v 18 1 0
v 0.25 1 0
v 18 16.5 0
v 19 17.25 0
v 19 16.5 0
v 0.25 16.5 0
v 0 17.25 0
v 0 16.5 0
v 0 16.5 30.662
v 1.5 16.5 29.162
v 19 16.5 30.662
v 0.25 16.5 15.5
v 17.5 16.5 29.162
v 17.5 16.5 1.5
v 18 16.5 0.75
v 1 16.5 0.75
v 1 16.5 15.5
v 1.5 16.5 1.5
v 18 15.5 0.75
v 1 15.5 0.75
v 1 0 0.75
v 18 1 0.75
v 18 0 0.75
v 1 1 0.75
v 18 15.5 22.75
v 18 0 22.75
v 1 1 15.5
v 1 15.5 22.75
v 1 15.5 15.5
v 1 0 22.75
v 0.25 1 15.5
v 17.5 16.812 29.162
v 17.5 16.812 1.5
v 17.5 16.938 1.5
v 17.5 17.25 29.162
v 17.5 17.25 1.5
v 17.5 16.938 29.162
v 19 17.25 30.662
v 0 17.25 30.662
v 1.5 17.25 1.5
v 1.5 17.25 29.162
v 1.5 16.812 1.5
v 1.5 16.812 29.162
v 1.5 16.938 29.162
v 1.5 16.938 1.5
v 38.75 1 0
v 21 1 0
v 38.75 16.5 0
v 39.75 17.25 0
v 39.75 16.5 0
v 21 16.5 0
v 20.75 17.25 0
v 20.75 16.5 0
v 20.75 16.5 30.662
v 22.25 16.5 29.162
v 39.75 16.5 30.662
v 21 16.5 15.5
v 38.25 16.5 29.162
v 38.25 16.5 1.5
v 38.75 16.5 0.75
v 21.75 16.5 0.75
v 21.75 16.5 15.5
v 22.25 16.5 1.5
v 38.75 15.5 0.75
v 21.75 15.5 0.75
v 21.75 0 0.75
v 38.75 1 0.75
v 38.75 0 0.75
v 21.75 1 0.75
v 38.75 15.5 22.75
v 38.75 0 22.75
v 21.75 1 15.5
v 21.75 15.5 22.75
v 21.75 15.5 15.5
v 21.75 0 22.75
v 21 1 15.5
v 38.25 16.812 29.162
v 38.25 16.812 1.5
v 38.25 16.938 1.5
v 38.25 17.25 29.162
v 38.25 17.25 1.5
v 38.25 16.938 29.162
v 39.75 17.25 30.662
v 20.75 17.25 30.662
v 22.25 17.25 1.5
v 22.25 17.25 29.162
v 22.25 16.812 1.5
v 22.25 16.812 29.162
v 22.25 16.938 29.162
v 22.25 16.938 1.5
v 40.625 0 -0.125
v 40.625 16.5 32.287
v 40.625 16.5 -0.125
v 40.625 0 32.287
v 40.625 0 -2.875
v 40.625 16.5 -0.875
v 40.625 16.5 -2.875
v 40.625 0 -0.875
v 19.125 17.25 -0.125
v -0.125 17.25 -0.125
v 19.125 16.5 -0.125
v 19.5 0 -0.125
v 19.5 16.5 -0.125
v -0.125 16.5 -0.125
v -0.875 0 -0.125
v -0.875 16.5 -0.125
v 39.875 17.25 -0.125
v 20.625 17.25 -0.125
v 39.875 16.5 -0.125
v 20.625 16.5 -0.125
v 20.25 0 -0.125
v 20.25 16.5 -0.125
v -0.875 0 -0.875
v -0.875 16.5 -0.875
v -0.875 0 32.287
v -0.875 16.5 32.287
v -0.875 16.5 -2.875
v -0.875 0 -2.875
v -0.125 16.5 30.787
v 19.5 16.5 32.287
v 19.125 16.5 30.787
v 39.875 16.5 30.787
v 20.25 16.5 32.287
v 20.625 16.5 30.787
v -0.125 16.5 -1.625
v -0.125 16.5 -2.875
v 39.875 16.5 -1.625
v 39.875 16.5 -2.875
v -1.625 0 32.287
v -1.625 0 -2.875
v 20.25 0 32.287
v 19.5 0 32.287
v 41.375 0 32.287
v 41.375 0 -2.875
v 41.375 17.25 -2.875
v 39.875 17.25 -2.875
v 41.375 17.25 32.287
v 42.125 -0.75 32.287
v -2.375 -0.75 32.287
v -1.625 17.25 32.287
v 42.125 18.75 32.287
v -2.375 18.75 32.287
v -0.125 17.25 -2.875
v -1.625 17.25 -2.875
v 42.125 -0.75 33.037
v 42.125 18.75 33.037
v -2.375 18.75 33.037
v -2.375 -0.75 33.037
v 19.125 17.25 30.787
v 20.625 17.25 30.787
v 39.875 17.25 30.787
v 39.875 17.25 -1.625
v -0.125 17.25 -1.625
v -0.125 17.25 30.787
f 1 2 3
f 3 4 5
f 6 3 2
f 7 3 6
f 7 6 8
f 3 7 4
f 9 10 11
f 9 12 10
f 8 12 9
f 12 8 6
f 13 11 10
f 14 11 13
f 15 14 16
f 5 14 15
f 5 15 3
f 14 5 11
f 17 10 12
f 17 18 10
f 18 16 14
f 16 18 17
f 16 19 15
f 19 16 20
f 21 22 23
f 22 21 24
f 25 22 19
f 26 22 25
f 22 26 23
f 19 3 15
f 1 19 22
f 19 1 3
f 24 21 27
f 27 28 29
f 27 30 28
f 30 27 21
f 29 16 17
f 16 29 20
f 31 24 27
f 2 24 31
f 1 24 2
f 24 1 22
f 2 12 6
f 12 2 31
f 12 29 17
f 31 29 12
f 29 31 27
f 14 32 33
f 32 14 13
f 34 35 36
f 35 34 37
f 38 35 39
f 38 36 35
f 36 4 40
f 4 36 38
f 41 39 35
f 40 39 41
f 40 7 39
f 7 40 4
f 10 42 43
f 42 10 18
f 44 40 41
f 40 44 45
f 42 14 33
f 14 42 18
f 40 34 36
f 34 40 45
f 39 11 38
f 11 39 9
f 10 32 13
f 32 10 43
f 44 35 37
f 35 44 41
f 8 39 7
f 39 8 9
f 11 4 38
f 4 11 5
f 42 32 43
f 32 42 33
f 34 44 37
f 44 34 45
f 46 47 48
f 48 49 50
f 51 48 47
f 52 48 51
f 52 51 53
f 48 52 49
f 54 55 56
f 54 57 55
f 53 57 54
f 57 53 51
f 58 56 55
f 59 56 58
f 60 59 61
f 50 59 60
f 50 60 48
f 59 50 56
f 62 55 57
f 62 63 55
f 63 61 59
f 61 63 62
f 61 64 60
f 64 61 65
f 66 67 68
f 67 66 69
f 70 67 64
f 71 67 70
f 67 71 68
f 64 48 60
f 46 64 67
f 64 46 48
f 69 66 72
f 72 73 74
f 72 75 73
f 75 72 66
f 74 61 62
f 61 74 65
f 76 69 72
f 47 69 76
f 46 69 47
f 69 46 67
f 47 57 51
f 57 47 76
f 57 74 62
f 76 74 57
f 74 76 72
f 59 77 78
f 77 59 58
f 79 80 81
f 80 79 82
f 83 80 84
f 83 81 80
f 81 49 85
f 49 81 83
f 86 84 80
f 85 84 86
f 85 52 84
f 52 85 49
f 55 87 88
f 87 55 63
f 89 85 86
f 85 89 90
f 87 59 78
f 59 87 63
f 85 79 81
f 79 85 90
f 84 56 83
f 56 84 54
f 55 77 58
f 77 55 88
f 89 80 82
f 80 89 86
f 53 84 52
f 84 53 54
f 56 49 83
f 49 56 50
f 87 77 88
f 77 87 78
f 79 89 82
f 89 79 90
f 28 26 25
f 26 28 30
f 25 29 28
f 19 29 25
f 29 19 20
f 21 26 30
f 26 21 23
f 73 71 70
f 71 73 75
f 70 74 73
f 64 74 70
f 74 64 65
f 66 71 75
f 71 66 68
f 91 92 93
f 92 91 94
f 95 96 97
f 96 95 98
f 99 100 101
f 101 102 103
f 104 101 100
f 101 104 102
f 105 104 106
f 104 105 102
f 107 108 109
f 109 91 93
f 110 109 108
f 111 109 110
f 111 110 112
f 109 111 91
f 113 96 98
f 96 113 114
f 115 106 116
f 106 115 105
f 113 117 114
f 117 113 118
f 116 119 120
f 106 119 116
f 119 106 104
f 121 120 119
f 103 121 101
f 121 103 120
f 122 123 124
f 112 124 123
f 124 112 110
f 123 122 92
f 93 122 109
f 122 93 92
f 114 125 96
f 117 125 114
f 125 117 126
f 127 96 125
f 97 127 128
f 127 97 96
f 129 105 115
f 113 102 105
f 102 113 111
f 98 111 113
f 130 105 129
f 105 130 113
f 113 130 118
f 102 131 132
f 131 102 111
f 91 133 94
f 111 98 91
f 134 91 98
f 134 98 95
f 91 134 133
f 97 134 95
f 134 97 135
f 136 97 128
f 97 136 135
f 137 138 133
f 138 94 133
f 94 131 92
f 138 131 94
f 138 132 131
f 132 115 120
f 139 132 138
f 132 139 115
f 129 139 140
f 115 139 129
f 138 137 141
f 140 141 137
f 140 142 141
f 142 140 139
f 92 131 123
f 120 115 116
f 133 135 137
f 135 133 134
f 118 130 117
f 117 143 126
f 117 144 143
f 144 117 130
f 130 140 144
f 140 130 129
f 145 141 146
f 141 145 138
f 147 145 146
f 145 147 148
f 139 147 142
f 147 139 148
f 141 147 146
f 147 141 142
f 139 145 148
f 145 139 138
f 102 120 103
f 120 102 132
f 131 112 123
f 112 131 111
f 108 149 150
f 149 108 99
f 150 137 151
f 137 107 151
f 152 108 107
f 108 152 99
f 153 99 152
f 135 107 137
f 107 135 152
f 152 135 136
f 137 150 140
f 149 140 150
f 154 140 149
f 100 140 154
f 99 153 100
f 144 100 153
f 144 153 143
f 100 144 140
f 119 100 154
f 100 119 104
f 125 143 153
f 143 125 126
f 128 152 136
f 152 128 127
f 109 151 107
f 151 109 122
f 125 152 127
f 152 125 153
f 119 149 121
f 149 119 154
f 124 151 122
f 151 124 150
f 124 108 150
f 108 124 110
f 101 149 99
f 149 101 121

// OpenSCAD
module board( size, label = false ) {
    // size[0] is always with the grain.
    // size[1] is against the grain.
    // size[2] is the board thickness.
    
    cube( size = size );
    
    // Output the size of the board for easy cut lists.
    echo( str( size[2], " ", label, ": ", size[0], "x", size[1]));
}

width_of_can = 17;
height_of_can = 22;
depth_of_can = 15.5;
number_of_cans = 2;
bead_board_inset = 1/2;
bead_board_thickness = 1/8;
lid_overhang_front = 1.5;  // Overhang for the lid front
lid_overhang_sides = .75; // Overhang for the lid sides
lid_overhang_back = .75; // Overhang for the back of the lid.

toe_clearance = 2; // Space between the bottom board and the floor.
stock_thickness = 3/4;
cabinet_door_clearance = 1/8;

horizontal_can_clearance = 1;
vertical_can_clearance = 3;
depth_can_clearance = 1; // Space behind cans.

each_can_cabinet_door_width = width_of_can + horizontal_can_clearance + horizontal_can_clearance;

each_can_cabinet_door_height =
    stock_thickness // The base of the tilting door.
    + sqrt( ( height_of_can * height_of_can ) + ( depth_of_can * depth_of_can ) ) // The longest diagonal across the can.
    + vertical_can_clearance // Extra space for clearance and garbage at the top.
    ;

face_frame_width = 1.5;
depth_of_box = depth_of_can + depth_can_clearance;

width_of_horizontal_base =
    (number_of_cans * ( each_can_cabinet_door_width + cabinet_door_clearance + cabinet_door_clearance ) ) // Space for doors and clearance.
    + ((number_of_cans + 1 ) * face_frame_width) // Space for the surrounding face frames
    - stock_thickness - stock_thickness // Minus the width of the end boards.
    ;

translate([0, depth_of_box+stock_thickness, 0]) rotate([-40 * $t, 0, 0]) translate([0, -depth_of_box-stock_thickness, 0]) union() {
    color( "white" ) {
    translate([0, depth_of_box + stock_thickness, 0])
    for (can_number=[0:number_of_cans-1]){
        // Cabinet doors.
        translate([
            ( can_number * ( each_can_cabinet_door_width + cabinet_door_clearance + face_frame_width + cabinet_door_clearance ) ),
            0,
            0
         ])
            rotate([90, 0, 0])
            union() {
                    // Base that holds the can.
        translate([width_of_can + ((each_can_cabinet_door_width - width_of_can) / 2), stock_thickness, stock_thickness]) 
            rotate([0, -90, 90])
            board( [ depth_of_can, width_of_can, stock_thickness], "can base" );
           
                // Base sides
                translate([((each_can_cabinet_door_width - width_of_can) / 2), 0, stock_thickness]) rotate([0, -90, 0]) board( [ depth_of_can, depth_of_box - depth_can_clearance, stock_thickness ], "can sides (combined)" );
            
                // Bottom board.
                translate([face_frame_width, 0, 0])
                    board([ each_can_cabinet_door_width - (face_frame_width * 2), face_frame_width, stock_thickness], "door face frame" );
            
                // Top Board.
                translate([face_frame_width, each_can_cabinet_door_height - face_frame_width, 0])
                    board([ each_can_cabinet_door_width - (face_frame_width * 2), face_frame_width, stock_thickness], "door face frame" );
            
                // Left board.
                translate([face_frame_width, 0, 0] )
                    rotate( [0, 0, 90 ] )
                    board( [ each_can_cabinet_door_height, face_frame_width, stock_thickness ], "door face frame" );
            
                // Right board.
                translate([each_can_cabinet_door_width, 0, 0] )
                    rotate( [0, 0, 90 ] )
                    board( [ each_can_cabinet_door_height, face_frame_width, stock_thickness ], "door face frame" );
            
                // Inset.
                color( "white" ) translate([each_can_cabinet_door_width - face_frame_width + bead_board_inset, face_frame_width - bead_board_inset, ( (stock_thickness - bead_board_thickness ) / 2) ])
                    rotate([0, 0, 90])
                    board([ each_can_cabinet_door_height + ( bead_board_inset * 2 ) - face_frame_width - face_frame_width, each_can_cabinet_door_width + ( bead_board_inset * 2 ) - face_frame_width - face_frame_width, bead_board_thickness], "beadboard" );
    }
}}
    // Mock up the cans.
    color( "orange") for (can_number=[0:number_of_cans-1]) {
        translate([
            ((each_can_cabinet_door_width - width_of_can) / 2)
    
        + (can_number * (each_can_cabinet_door_width + cabinet_door_clearance + cabinet_door_clearance + face_frame_width ) )
    
        ,
            0, stock_thickness
        ])
            cube([width_of_can, depth_of_can, height_of_can]);
    }

}{

// Bottom support board.
color( "white" ) translate([
    -cabinet_door_clearance + stock_thickness - face_frame_width,
    0,
    -stock_thickness - cabinet_door_clearance
    ])
    board( [ width_of_horizontal_base, depth_of_box, stock_thickness ], "box frame (bottom)" );

// Near side.
color( "white" ) translate( [ stock_thickness - cabinet_door_clearance - face_frame_width + width_of_horizontal_base + stock_thickness, 0, -toe_clearance - stock_thickness - cabinet_door_clearance ] )
rotate( [ 0, -90, 0 ] )
    board( [
        toe_clearance + stock_thickness + cabinet_door_clearance + each_can_cabinet_door_height + cabinet_door_clearance + face_frame_width,
        depth_of_box,
        stock_thickness
    ], "box frame" );

// Far side
color( "white" ) translate( [ -cabinet_door_clearance + stock_thickness - face_frame_width, 0, -toe_clearance - stock_thickness - cabinet_door_clearance ] )
rotate( [ 0, -90, 0 ] )
    board( [
        toe_clearance + stock_thickness + cabinet_door_clearance + each_can_cabinet_door_height + cabinet_door_clearance + face_frame_width,
        depth_of_box,
        stock_thickness
    ], "box frame" );

// Top
color( "tan" ) translate([
    -(face_frame_width - stock_thickness) - stock_thickness - lid_overhang_sides - cabinet_door_clearance,
    -lid_overhang_back,
    -stock_thickness - cabinet_door_clearance + cabinet_door_clearance + each_can_cabinet_door_height + cabinet_door_clearance + stock_thickness + face_frame_width
    ])
    board( [ width_of_horizontal_base + stock_thickness + stock_thickness + lid_overhang_sides + lid_overhang_sides, depth_of_box + lid_overhang_front + lid_overhang_back + stock_thickness, stock_thickness ], "box frame top" );
    
// Vertical dividers.
color( "white" ) for (can_number = [0:number_of_cans-2]) {
    translate([
        stock_thickness
        + each_can_cabinet_door_width
        - (stock_thickness/2)
        + ((face_frame_width + cabinet_door_clearance + cabinet_door_clearance)/2)
        // Everything above is to place the first one after the first door.
        // The rest is to shift every next divider over the equivalent number of full door widths.
        + ( 
            can_number *
            (
                each_can_cabinet_door_width
                + cabinet_door_clearance
                + cabinet_door_clearance
                + face_frame_width
            )
        )
        ,
        0,
        -cabinet_door_clearance])
    rotate([0, -90, 0])
        board( [ each_can_cabinet_door_height + cabinet_door_clearance + cabinet_door_clearance + face_frame_width, depth_of_box, stock_thickness ], "box frame (interior vertical)" );
}

// Face frame

// Near stile
color( "white" ) translate([-cabinet_door_clearance - face_frame_width, depth_of_box, -cabinet_door_clearance - stock_thickness - toe_clearance]) 
rotate([0, -90, -90])
    board([toe_clearance + stock_thickness + cabinet_door_clearance + each_can_cabinet_door_height + cabinet_door_clearance + face_frame_width, face_frame_width, stock_thickness], "face frame");

// Far stile
color( "white" ) translate([-cabinet_door_clearance - face_frame_width - ( face_frame_width - stock_thickness) + width_of_horizontal_base + stock_thickness, depth_of_box, -cabinet_door_clearance - stock_thickness - toe_clearance]) 
rotate([0, -90, -90])
    board([toe_clearance + stock_thickness + cabinet_door_clearance + each_can_cabinet_door_height + cabinet_door_clearance + face_frame_width, face_frame_width, stock_thickness], "face frame");

// Bottom rail
color( "white" ) translate([-cabinet_door_clearance, depth_of_box, -cabinet_door_clearance - face_frame_width])
    translate([0, stock_thickness, 0]) rotate([90, 0, 0]) board([width_of_horizontal_base - ((face_frame_width - stock_thickness) * 2), face_frame_width, stock_thickness], "face frame");

// Top rail
color( "white" ) translate([-cabinet_door_clearance, depth_of_box, -cabinet_door_clearance - face_frame_width + each_can_cabinet_door_height + cabinet_door_clearance + cabinet_door_clearance + face_frame_width])
    translate([0, stock_thickness, 0]) rotate([90, 0, 0]) board([width_of_horizontal_base - ((face_frame_width - stock_thickness) * 2), face_frame_width, stock_thickness], "face frame");

// Vertical stiles.
color( "white" ) for (can_number = [0:number_of_cans-2]) {
    translate([
        stock_thickness
        + each_can_cabinet_door_width
        - (stock_thickness/2)
        + ((face_frame_width + cabinet_door_clearance + cabinet_door_clearance)/2)
        - stock_thickness
        - ( ( face_frame_width - stock_thickness ) / 2 )
        // Everything above is to place the first one after the first door.
        // The rest is to shift every next divider over the equivalent number of full door widths.
        + ( 
            can_number *
            (
                each_can_cabinet_door_width
                + cabinet_door_clearance
                + cabinet_door_clearance
                + face_frame_width
            )
        )
        ,
        depth_of_box,
        -cabinet_door_clearance])
    rotate([0, -90, -90])
        board( [ each_can_cabinet_door_height + cabinet_door_clearance + cabinet_door_clearance, face_frame_width, stock_thickness ], "face frame (interior vertical)" );
}
}
